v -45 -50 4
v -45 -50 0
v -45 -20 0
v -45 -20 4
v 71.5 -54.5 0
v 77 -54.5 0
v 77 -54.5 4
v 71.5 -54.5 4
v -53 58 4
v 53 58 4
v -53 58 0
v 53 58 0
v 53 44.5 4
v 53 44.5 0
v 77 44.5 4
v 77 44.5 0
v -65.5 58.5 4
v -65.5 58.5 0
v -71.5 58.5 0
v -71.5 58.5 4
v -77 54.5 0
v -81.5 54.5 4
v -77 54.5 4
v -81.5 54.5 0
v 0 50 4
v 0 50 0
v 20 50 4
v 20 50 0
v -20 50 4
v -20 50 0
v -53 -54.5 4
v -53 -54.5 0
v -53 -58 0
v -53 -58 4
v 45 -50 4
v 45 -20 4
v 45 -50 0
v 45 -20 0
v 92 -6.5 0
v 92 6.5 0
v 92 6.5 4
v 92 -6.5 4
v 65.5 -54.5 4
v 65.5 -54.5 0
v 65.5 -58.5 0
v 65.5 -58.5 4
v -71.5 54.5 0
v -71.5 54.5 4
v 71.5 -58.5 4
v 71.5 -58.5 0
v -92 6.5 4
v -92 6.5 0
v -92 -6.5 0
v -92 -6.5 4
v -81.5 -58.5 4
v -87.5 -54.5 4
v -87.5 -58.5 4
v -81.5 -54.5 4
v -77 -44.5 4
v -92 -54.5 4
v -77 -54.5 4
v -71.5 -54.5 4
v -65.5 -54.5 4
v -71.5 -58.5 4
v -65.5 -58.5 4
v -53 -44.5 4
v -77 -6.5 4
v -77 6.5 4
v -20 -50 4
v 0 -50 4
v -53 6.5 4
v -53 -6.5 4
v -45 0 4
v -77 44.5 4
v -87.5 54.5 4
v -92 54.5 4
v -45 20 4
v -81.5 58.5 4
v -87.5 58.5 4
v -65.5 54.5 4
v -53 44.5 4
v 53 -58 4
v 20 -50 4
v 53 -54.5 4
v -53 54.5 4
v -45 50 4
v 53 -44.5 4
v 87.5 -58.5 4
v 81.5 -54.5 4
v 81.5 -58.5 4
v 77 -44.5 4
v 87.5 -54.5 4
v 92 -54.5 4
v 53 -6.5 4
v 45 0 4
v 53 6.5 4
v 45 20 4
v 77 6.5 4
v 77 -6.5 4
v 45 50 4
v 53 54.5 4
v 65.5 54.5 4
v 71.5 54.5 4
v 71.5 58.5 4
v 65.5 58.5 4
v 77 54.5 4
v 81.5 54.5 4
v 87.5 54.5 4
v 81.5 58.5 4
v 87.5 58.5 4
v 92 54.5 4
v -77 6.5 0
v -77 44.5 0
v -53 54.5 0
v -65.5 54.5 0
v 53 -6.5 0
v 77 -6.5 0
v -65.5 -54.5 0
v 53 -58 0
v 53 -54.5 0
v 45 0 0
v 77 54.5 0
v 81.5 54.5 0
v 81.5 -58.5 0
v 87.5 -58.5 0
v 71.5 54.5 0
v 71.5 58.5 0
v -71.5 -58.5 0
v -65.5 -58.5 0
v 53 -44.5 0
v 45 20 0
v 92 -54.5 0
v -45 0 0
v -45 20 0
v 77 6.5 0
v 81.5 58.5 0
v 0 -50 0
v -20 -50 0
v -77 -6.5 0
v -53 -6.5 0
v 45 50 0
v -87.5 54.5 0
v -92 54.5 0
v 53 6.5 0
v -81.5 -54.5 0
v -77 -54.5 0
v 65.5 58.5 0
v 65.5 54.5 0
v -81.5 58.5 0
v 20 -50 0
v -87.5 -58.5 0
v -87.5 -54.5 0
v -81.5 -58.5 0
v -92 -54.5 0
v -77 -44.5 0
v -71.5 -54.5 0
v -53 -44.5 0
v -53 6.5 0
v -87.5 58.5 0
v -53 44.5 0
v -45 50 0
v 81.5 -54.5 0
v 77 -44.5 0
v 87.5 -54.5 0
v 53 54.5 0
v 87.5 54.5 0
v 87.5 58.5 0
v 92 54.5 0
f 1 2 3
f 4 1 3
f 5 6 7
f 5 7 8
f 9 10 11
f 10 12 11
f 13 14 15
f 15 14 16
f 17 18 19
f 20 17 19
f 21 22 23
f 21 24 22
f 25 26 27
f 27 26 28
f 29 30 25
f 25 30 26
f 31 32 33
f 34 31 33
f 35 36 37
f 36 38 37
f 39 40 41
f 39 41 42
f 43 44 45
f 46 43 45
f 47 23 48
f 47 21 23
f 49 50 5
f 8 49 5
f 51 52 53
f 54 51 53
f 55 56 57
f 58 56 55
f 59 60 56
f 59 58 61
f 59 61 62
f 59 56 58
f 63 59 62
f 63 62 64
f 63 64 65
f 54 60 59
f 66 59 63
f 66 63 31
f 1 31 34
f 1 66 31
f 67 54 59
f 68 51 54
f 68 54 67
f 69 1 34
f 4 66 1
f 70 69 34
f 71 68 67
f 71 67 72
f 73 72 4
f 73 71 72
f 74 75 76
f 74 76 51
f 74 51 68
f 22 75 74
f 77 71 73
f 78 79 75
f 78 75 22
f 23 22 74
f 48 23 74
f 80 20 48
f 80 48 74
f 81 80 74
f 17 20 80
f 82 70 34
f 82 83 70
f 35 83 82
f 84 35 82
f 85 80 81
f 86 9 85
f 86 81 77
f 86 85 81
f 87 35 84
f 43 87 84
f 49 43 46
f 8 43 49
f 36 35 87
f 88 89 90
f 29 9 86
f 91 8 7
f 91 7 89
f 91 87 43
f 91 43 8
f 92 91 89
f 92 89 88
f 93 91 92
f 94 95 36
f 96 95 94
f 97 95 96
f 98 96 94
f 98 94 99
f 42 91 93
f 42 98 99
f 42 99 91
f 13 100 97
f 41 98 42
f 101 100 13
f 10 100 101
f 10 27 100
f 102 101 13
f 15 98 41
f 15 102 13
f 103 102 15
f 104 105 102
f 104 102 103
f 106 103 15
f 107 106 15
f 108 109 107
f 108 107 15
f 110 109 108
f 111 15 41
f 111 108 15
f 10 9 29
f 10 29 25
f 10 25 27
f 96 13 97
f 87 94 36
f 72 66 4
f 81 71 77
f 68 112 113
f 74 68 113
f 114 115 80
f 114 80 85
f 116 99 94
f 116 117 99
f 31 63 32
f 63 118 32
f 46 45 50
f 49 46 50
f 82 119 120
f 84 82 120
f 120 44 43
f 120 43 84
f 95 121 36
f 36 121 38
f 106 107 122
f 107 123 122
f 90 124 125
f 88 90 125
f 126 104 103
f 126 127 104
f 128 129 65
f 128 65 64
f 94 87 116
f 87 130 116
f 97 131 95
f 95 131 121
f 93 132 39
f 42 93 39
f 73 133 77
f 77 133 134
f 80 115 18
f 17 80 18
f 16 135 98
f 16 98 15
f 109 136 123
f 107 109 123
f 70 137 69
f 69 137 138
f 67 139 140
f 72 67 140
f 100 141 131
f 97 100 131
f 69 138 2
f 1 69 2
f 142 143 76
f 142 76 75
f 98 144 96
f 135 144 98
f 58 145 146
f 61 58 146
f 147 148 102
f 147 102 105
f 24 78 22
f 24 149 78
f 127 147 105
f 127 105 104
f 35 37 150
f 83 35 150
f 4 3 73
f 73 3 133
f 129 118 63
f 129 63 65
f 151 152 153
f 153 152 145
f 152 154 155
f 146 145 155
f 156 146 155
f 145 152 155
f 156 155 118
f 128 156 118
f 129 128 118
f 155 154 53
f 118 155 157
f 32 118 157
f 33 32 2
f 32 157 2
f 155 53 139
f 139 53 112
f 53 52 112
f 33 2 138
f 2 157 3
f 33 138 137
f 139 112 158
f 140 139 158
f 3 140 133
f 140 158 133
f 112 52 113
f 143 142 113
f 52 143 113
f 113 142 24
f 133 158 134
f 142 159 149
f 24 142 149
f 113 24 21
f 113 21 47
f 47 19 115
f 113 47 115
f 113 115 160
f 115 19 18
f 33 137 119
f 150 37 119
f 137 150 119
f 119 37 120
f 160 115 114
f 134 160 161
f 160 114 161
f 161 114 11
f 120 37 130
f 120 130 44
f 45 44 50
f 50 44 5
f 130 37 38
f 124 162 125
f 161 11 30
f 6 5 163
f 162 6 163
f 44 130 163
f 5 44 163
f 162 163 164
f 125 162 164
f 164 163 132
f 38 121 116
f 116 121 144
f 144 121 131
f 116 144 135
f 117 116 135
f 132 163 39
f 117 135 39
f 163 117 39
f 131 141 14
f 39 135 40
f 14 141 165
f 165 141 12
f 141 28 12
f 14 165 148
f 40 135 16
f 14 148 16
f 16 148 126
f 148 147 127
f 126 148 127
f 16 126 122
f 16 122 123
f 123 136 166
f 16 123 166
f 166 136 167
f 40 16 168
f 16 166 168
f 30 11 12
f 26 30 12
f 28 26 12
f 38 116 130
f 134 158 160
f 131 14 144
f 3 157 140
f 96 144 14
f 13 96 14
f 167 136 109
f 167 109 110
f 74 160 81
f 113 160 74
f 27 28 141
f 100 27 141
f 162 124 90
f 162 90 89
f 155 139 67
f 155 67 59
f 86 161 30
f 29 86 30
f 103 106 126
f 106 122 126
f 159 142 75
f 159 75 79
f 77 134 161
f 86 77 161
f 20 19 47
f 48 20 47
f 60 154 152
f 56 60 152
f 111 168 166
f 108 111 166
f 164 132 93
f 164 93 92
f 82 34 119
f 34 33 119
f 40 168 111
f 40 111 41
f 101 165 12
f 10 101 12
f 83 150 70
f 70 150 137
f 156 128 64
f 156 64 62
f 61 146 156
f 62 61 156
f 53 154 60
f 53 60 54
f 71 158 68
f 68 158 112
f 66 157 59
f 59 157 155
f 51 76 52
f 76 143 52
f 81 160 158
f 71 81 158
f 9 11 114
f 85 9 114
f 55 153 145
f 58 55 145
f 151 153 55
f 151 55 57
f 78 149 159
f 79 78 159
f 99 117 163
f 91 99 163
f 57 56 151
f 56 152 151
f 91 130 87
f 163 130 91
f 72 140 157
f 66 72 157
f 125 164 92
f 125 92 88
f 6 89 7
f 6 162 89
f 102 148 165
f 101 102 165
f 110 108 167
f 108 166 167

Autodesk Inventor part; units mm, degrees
ref_plane "YZ Plane" through (0, 0, 0) normal (1, 0, 0) x (0, 1, 0)
ref_plane "XZ Plane" through (0, 0, 0) normal (0, 1, 0) x (-1, 0, 0)
ref_plane "XY Plane" through (0, 0, 0) normal (0, 0, 1) x (1, 0, 0)
sketch "Sketch1" plane through (0, 0, 0) normal (0, 0, 1) x (1, 0, 0)
  line L0 (45, -50) -> (-45, -50)
  line L1 (-45, -50) -> (-45, 50)
  line L2 (-45, 50) -> (45, 50)
  line L3 (45, 50) -> (45, -50)
  line L4 (45, -50) -> (-45, 50) construction
  line L5 (-45, -50) -> (45, 50) construction
  line L6 (53, 58) -> (-53, 58)
  line L7 (-53, 58) -> (-53, 54.5)
  line L8 (-53, -58) -> (53, -58)
  line L9 (53, -58) -> (53, -54.5)
  line L10 (-20, 50) -> (20, 50)
  line L11 (-20, -50) -> (20, -50)
  line L12 (-45, -20) -> (-45, 20)
  line L13 (45, -20) -> (45, 20)
  line L14 (-53, 6.5) -> (-77, 6.5)
  line L15 (-53, -6.5) -> (-53, 6.5) construction
  line L16 (-53, 0) -> (53, 0)
  line L17 (0, 50) -> (0, -50)
  line L18 (-53, 6.5) -> (-53, -6.5) construction
  line L19 (-53, -6.5) -> (-53, -44.5)
  line L20 (53, 6.5) -> (53, 44.5)
  line L21 (53, -6.5) -> (53, 6.5) construction
  line L22 (-92, -6.5) -> (-77, -6.5) construction
  line L23 (-77, -6.5) -> (-77, -44.5)
  line L24 (-77, -58) -> (-92, -58) construction
  line L25 (-92, -58) -> (-92, -54.5) construction
  line L26 (-92, -58) -> (-77, -58) construction
  line L27 (-77, -58) -> (-77, -58.5) construction
  line L28 (-77, -58.5) -> (-81.5, -58.5) construction
  line L29 (-92, -58.5) -> (-92, -58) construction
  line L30 (-92, -54.5) -> (-87.5, -54.5)
  line L31 (-87.5, -54.5) -> (-87.5, -58.5)
  line L32 (-81.5, -58.5) -> (-81.5, -54.5)
  line L33 (-81.5, -54.5) -> (-77, -54.5)
  line L34 (-77, 6.5) -> (-77, 44.5)
  line L35 (-77, 58) -> (-92, 58) construction
  line L36 (-92, 58) -> (-92, 54.5) construction
  line L37 (-92, 58) -> (-77, 58) construction
  line L38 (-77, 58) -> (-77, 58.5) construction
  line L39 (-77, 58.5) -> (-81.5, 58.5) construction
  line L40 (-92, 58.5) -> (-92, 58) construction
  line L41 (-92, 54.5) -> (-87.5, 54.5)
  line L42 (-87.5, 54.5) -> (-87.5, 58.5)
  line L43 (-81.5, 58.5) -> (-81.5, 54.5)
  line L44 (-81.5, 54.5) -> (-77, 54.5)
  line L45 (-77, 6.5) -> (-92, 6.5) construction
  line L46 (-92, -6.5) -> (-77, -6.5) construction
  line L47 (-77, -6.5) -> (-53, -6.5)
  line L48 (-77, 54.5) -> (-77, 58) construction
  line L49 (-92, 54.5) -> (-92, 6.5)
  line L50 (-87.5, 58.5) -> (-92, 58.5) construction
  line L51 (-81.5, 58.5) -> (-87.5, 58.5)
  line L52 (-92, -54.5) -> (-92, -6.5)
  line L53 (-87.5, -58.5) -> (-92, -58.5) construction
  line L54 (-81.5, -58.5) -> (-87.5, -58.5)
  line L55 (-77, -54.5) -> (-77, -58) construction
  line L56 (-77, 54.5) -> (-71.5, 54.5)
  line L57 (-53, 54.5) -> (-53, 44.5) construction
  line L58 (-53, 44.5) -> (-77, 44.5)
  line L59 (-77, 44.5) -> (-77, 54.5) construction
  line L60 (-77, -54.5) -> (-71.5, -54.5)
  line L61 (-53, -54.5) -> (-53, -54)
  line L62 (-53, -44.5) -> (-77, -44.5)
  line L63 (-77, -44.5) -> (-77, -54.5) construction
  line L64 (-71.5, 54.5) -> (-65.5, 54.5) construction
  line L65 (-65.5, 54.5) -> (-65.5, 58.5)
  line L66 (-65.5, 58.5) -> (-71.5, 58.5)
  line L67 (-71.5, 58.5) -> (-71.5, 54.5)
  line L68 (-71.5, -54.5) -> (-65.5, -54.5) construction
  line L69 (-65.5, -54.5) -> (-65.5, -58.5)
  line L70 (-65.5, -58.5) -> (-71.5, -58.5)
  line L71 (-71.5, -58.5) -> (-71.5, -54.5)
  line L72 (-71.5, 54.5) -> (-65.5, 54.5) construction
  line L73 (-65.5, 54.5) -> (-53, 54.5)
  line L74 (-77, 44.5) -> (-77, 54.5) construction
  line L75 (-53, 44.5) -> (-53, 6.5)
  line L76 (-53, 54.5) -> (-53, 44.5) construction
  line L77 (-77, -44.5) -> (-77, -54.5) construction
  line L78 (-53, -44.5) -> (-53, -54.5) construction
  line L79 (-53, -54) -> (-53, -44.5) construction
  line L80 (-65.5, -54.5) -> (-53, -54.5)
  line L81 (-71.5, -54.5) -> (-65.5, -54.5) construction
  line L82 (-53, -54.5) -> (-53, -58)
  line L83 (53, 6.5) -> (77, 6.5)
  line L84 (92, -6.5) -> (77, -6.5) construction
  line L85 (77, -6.5) -> (77, -44.5)
  line L86 (77, -58) -> (92, -58) construction
  line L87 (92, -58) -> (92, -54.5) construction
  line L88 (92, -58) -> (77, -58) construction
  line L89 (77, -58) -> (77, -58.5) construction
  line L90 (77, -58.5) -> (81.5, -58.5) construction
  line L91 (92, -58.5) -> (92, -58) construction
  line L92 (92, -54.5) -> (87.5, -54.5)
  line L93 (87.5, -54.5) -> (87.5, -58.5)
  line L94 (81.5, -58.5) -> (81.5, -54.5)
  line L95 (81.5, -54.5) -> (77, -54.5)
  line L96 (92, 54.5) -> (87.5, 54.5)
  line L97 (92, 58) -> (92, 54.5) construction
  line L98 (77, 6.5) -> (77, 44.5)
  line L99 (81.5, 54.5) -> (77, 54.5)
  line L100 (77, 58) -> (92, 58) construction
  line L101 (92, 58) -> (77, 58) construction
  line L102 (77, 58) -> (77, 58.5) construction
  line L103 (77, 58.5) -> (81.5, 58.5) construction
  line L104 (81.5, 58.5) -> (81.5, 54.5)
  line L105 (92, 58.5) -> (92, 58) construction
  line L106 (87.5, 54.5) -> (87.5, 58.5)
  line L107 (77, 6.5) -> (92, 6.5) construction
  line L108 (92, -6.5) -> (77, -6.5) construction
  line L109 (77, -6.5) -> (53, -6.5)
  line L110 (77, 54.5) -> (77, 58) construction
  line L111 (92, 54.5) -> (92, 6.5)
  line L112 (87.5, 58.5) -> (92, 58.5) construction
  line L113 (81.5, 58.5) -> (87.5, 58.5)
  line L114 (92, -54.5) -> (92, -6.5)
  line L115 (87.5, -58.5) -> (92, -58.5) construction
  line L116 (81.5, -58.5) -> (87.5, -58.5)
  line L117 (77, -54.5) -> (77, -58) construction
  line L118 (77, 54.5) -> (71.5, 54.5)
  line L119 (53, 44.5) -> (77, 44.5)
  line L120 (77, 44.5) -> (77, 54.5) construction
  line L121 (77, -54.5) -> (71.5, -54.5)
  line L122 (53, -44.5) -> (77, -44.5)
  line L123 (77, -44.5) -> (77, -54.5) construction
  line L124 (71.5, 54.5) -> (65.5, 54.5) construction
  line L125 (65.5, 54.5) -> (65.5, 58.5)
  line L126 (65.5, 58.5) -> (71.5, 58.5)
  line L127 (71.5, 58.5) -> (71.5, 54.5)
  line L128 (71.5, -54.5) -> (65.5, -54.5) construction
  line L129 (65.5, -54.5) -> (65.5, -58.5)
  line L130 (65.5, -58.5) -> (71.5, -58.5)
  line L131 (71.5, -58.5) -> (71.5, -54.5)
  line L132 (71.5, 54.5) -> (65.5, 54.5) construction
  line L133 (65.5, 54.5) -> (53, 54.5)
  line L134 (77, 44.5) -> (77, 54.5) construction
  line L135 (77, -44.5) -> (77, -54.5) construction
  line L136 (65.5, -54.5) -> (53, -54.5)
  line L137 (71.5, -54.5) -> (65.5, -54.5) construction
  line L138 (53, 44.5) -> (53, 54.5) construction
  line L139 (53, 54.5) -> (53, 58)
  line L140 (53, -44.5) -> (53, -6.5)
  line L141 (53, -54.5) -> (53, -44.5) construction
  line L142 (-92, 6.5) -> (-92, -6.5)
  line L143 (92, 6.5) -> (92, -6.5)
  point P0 (0, 0)
  point P1 (0, 54)
  point P2 (0, 0)
  point P3 (-49, 0)
  point P4 (0, 0)
  point P5 (-53, 0)
  point P6 (0, 0)
  point P7 (0, 0)
  point P8 (-84.5, -58)
  point P9 (-84.5, 58)
  point P10 (-65, 44.5)
  point P11 (-81.5, 56.5)
  point P12 (-71.5, 56.5)
  point P13 (84.5, -58)
  point P14 (84.5, 58)
  point P15 (65, 44.5)
  point P16 (81.5, 56.5)
  point P17 (71.5, 56.5)
  dimension "d0" = 100
  dimension "d1" = 90
  dimension "d2" = 8
  dimension "d16" = 15
  dimension "d17" = 0.5
  dimension "d18" = 6
  dimension "d19" = 4.5
  dimension "d20" = 4.5
  dimension "d21" = 4
  dimension "d24" = 10
  dimension "d25" = 10
  dimension "d27" = 10
  dimension "d28" = 6
  dimension "d29" = 8
  dimension "d30" = 8
  dimension "d31" = 4.5
  dimension "d32" = 24
extrude "Extrusion1" add sketch "Sketch1" along normal blind 4
properties part number "DoorFrameFront_V2" material "Wood (Oak)"
